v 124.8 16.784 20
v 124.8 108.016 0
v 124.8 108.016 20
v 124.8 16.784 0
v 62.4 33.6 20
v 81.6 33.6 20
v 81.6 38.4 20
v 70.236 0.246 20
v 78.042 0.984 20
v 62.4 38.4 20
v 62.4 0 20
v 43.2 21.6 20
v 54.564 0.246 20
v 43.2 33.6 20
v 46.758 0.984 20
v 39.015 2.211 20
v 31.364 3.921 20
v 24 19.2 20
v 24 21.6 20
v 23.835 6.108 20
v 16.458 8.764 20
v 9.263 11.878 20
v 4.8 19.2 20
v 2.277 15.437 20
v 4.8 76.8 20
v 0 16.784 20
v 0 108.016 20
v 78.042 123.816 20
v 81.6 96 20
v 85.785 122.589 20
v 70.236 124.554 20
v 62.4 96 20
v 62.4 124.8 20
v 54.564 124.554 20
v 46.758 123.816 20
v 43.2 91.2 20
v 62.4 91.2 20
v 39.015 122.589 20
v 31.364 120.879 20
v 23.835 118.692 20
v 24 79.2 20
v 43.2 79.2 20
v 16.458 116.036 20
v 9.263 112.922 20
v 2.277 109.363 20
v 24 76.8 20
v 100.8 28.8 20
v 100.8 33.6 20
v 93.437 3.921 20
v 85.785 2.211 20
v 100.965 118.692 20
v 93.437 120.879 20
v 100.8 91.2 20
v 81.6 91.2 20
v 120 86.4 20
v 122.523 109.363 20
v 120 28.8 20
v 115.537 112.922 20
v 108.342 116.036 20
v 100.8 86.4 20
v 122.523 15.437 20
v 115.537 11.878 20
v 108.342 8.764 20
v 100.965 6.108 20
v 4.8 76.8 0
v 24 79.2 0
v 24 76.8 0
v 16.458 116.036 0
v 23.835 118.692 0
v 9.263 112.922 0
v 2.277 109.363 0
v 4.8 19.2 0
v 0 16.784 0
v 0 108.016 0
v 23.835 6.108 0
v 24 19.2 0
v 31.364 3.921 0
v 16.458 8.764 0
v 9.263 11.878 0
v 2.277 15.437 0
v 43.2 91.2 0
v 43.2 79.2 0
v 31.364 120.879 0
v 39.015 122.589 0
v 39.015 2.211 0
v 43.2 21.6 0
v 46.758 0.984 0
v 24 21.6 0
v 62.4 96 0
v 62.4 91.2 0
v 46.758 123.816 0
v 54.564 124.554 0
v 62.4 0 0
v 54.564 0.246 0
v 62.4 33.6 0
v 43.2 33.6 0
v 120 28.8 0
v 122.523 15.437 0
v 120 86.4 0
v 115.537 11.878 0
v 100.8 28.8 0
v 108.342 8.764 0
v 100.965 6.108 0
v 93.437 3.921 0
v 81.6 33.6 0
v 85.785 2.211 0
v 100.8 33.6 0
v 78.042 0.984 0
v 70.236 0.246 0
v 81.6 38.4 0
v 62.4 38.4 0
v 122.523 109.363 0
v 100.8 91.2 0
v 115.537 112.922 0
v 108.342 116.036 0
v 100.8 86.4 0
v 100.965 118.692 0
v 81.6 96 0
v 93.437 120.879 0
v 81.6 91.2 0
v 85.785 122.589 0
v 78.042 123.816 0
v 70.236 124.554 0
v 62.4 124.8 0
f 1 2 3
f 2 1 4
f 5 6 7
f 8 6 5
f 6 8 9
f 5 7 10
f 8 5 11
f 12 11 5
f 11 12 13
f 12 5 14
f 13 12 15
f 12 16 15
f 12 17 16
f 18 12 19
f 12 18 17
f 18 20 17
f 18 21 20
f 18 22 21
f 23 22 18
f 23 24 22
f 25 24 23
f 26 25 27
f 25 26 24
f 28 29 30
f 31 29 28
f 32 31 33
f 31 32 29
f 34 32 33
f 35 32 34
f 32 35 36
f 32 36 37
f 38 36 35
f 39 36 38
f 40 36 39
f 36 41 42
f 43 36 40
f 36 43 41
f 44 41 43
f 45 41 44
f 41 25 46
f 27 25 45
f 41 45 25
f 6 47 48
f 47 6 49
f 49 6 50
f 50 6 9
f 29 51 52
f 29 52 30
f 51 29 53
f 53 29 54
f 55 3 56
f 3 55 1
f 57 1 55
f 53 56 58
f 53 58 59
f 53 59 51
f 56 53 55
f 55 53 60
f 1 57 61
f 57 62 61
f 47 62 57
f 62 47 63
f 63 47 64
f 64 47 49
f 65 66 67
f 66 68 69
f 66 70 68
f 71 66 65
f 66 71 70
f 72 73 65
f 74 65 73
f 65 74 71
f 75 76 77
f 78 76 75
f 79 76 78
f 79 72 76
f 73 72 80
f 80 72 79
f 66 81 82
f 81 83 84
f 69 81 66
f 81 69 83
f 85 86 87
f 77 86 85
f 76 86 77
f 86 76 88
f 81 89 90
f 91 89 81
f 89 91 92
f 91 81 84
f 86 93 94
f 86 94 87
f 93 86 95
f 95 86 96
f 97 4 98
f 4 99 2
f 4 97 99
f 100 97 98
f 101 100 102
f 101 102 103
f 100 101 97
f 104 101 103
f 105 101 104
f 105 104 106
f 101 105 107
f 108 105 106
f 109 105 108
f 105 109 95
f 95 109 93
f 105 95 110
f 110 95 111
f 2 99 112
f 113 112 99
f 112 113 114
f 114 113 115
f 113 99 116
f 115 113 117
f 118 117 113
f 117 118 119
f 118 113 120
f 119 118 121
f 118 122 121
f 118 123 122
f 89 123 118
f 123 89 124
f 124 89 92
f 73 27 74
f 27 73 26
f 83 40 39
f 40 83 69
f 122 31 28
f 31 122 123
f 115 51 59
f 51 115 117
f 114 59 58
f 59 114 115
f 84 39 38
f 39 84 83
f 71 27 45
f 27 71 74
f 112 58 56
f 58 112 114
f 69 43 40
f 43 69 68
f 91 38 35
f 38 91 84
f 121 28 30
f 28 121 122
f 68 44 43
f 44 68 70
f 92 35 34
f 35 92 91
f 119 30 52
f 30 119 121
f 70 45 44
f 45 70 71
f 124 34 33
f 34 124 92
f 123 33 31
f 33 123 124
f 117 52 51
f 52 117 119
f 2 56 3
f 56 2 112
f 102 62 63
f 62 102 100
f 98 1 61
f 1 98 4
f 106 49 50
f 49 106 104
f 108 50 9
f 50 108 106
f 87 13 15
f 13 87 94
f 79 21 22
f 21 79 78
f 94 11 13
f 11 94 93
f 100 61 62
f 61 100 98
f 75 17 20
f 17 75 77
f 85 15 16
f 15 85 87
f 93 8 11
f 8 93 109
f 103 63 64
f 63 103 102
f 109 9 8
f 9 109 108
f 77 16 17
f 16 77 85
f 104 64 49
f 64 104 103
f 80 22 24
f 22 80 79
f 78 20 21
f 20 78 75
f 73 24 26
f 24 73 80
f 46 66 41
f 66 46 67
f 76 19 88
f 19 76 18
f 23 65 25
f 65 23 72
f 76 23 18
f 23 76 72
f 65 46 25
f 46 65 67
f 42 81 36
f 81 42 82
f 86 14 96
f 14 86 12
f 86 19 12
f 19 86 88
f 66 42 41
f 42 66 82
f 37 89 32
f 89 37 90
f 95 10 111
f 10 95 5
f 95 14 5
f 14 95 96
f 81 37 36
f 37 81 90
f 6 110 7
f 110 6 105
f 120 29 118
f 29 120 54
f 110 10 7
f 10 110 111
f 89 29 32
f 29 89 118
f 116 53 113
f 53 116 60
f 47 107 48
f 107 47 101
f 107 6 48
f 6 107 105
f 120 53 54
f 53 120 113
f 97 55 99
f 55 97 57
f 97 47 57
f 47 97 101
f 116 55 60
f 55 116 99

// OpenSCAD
module key_hole(key_pitch, unit, height) {
  cube([key_pitch, key_pitch * unit, height], false);
}

module key_holes(key_pitch, row_offset) {
  union() {
    for (column = [0 : 5], row = [0 : 2]) {
      translate([key_pitch * column, key_pitch * (row + row_offset[column]), 0]) {
        key_hole(key_pitch, 1, 20);
      }
    }
  }
}

module body(height) {
  intersection() {
    cube([19.2 * (6.5), 19.2 * 6.5, height]);
    translate([19.2 * (6.5 / 2), 0, 0]) {
      cylinder(height, r=19.2 * 6.5, false, $fn=100);
    }
    translate([19.2 * (6.5 / 2), 19.2 * 6.5, 0]) {
      cylinder(height, r=19.2 * 6.5, false, $fn=100);
    }
  }
}

render(convexity = 10) { // これを入れると厚み0の隙間が消える。正直理解してない。
  difference() {
    body(20);
    translate([19.2 * (2 / 8), 19.2, 0]) {
      key_holes(19.2, [0/8, 1/8, 6/8, 8/8, 6/8, 4/8]);
    }
  }
}
